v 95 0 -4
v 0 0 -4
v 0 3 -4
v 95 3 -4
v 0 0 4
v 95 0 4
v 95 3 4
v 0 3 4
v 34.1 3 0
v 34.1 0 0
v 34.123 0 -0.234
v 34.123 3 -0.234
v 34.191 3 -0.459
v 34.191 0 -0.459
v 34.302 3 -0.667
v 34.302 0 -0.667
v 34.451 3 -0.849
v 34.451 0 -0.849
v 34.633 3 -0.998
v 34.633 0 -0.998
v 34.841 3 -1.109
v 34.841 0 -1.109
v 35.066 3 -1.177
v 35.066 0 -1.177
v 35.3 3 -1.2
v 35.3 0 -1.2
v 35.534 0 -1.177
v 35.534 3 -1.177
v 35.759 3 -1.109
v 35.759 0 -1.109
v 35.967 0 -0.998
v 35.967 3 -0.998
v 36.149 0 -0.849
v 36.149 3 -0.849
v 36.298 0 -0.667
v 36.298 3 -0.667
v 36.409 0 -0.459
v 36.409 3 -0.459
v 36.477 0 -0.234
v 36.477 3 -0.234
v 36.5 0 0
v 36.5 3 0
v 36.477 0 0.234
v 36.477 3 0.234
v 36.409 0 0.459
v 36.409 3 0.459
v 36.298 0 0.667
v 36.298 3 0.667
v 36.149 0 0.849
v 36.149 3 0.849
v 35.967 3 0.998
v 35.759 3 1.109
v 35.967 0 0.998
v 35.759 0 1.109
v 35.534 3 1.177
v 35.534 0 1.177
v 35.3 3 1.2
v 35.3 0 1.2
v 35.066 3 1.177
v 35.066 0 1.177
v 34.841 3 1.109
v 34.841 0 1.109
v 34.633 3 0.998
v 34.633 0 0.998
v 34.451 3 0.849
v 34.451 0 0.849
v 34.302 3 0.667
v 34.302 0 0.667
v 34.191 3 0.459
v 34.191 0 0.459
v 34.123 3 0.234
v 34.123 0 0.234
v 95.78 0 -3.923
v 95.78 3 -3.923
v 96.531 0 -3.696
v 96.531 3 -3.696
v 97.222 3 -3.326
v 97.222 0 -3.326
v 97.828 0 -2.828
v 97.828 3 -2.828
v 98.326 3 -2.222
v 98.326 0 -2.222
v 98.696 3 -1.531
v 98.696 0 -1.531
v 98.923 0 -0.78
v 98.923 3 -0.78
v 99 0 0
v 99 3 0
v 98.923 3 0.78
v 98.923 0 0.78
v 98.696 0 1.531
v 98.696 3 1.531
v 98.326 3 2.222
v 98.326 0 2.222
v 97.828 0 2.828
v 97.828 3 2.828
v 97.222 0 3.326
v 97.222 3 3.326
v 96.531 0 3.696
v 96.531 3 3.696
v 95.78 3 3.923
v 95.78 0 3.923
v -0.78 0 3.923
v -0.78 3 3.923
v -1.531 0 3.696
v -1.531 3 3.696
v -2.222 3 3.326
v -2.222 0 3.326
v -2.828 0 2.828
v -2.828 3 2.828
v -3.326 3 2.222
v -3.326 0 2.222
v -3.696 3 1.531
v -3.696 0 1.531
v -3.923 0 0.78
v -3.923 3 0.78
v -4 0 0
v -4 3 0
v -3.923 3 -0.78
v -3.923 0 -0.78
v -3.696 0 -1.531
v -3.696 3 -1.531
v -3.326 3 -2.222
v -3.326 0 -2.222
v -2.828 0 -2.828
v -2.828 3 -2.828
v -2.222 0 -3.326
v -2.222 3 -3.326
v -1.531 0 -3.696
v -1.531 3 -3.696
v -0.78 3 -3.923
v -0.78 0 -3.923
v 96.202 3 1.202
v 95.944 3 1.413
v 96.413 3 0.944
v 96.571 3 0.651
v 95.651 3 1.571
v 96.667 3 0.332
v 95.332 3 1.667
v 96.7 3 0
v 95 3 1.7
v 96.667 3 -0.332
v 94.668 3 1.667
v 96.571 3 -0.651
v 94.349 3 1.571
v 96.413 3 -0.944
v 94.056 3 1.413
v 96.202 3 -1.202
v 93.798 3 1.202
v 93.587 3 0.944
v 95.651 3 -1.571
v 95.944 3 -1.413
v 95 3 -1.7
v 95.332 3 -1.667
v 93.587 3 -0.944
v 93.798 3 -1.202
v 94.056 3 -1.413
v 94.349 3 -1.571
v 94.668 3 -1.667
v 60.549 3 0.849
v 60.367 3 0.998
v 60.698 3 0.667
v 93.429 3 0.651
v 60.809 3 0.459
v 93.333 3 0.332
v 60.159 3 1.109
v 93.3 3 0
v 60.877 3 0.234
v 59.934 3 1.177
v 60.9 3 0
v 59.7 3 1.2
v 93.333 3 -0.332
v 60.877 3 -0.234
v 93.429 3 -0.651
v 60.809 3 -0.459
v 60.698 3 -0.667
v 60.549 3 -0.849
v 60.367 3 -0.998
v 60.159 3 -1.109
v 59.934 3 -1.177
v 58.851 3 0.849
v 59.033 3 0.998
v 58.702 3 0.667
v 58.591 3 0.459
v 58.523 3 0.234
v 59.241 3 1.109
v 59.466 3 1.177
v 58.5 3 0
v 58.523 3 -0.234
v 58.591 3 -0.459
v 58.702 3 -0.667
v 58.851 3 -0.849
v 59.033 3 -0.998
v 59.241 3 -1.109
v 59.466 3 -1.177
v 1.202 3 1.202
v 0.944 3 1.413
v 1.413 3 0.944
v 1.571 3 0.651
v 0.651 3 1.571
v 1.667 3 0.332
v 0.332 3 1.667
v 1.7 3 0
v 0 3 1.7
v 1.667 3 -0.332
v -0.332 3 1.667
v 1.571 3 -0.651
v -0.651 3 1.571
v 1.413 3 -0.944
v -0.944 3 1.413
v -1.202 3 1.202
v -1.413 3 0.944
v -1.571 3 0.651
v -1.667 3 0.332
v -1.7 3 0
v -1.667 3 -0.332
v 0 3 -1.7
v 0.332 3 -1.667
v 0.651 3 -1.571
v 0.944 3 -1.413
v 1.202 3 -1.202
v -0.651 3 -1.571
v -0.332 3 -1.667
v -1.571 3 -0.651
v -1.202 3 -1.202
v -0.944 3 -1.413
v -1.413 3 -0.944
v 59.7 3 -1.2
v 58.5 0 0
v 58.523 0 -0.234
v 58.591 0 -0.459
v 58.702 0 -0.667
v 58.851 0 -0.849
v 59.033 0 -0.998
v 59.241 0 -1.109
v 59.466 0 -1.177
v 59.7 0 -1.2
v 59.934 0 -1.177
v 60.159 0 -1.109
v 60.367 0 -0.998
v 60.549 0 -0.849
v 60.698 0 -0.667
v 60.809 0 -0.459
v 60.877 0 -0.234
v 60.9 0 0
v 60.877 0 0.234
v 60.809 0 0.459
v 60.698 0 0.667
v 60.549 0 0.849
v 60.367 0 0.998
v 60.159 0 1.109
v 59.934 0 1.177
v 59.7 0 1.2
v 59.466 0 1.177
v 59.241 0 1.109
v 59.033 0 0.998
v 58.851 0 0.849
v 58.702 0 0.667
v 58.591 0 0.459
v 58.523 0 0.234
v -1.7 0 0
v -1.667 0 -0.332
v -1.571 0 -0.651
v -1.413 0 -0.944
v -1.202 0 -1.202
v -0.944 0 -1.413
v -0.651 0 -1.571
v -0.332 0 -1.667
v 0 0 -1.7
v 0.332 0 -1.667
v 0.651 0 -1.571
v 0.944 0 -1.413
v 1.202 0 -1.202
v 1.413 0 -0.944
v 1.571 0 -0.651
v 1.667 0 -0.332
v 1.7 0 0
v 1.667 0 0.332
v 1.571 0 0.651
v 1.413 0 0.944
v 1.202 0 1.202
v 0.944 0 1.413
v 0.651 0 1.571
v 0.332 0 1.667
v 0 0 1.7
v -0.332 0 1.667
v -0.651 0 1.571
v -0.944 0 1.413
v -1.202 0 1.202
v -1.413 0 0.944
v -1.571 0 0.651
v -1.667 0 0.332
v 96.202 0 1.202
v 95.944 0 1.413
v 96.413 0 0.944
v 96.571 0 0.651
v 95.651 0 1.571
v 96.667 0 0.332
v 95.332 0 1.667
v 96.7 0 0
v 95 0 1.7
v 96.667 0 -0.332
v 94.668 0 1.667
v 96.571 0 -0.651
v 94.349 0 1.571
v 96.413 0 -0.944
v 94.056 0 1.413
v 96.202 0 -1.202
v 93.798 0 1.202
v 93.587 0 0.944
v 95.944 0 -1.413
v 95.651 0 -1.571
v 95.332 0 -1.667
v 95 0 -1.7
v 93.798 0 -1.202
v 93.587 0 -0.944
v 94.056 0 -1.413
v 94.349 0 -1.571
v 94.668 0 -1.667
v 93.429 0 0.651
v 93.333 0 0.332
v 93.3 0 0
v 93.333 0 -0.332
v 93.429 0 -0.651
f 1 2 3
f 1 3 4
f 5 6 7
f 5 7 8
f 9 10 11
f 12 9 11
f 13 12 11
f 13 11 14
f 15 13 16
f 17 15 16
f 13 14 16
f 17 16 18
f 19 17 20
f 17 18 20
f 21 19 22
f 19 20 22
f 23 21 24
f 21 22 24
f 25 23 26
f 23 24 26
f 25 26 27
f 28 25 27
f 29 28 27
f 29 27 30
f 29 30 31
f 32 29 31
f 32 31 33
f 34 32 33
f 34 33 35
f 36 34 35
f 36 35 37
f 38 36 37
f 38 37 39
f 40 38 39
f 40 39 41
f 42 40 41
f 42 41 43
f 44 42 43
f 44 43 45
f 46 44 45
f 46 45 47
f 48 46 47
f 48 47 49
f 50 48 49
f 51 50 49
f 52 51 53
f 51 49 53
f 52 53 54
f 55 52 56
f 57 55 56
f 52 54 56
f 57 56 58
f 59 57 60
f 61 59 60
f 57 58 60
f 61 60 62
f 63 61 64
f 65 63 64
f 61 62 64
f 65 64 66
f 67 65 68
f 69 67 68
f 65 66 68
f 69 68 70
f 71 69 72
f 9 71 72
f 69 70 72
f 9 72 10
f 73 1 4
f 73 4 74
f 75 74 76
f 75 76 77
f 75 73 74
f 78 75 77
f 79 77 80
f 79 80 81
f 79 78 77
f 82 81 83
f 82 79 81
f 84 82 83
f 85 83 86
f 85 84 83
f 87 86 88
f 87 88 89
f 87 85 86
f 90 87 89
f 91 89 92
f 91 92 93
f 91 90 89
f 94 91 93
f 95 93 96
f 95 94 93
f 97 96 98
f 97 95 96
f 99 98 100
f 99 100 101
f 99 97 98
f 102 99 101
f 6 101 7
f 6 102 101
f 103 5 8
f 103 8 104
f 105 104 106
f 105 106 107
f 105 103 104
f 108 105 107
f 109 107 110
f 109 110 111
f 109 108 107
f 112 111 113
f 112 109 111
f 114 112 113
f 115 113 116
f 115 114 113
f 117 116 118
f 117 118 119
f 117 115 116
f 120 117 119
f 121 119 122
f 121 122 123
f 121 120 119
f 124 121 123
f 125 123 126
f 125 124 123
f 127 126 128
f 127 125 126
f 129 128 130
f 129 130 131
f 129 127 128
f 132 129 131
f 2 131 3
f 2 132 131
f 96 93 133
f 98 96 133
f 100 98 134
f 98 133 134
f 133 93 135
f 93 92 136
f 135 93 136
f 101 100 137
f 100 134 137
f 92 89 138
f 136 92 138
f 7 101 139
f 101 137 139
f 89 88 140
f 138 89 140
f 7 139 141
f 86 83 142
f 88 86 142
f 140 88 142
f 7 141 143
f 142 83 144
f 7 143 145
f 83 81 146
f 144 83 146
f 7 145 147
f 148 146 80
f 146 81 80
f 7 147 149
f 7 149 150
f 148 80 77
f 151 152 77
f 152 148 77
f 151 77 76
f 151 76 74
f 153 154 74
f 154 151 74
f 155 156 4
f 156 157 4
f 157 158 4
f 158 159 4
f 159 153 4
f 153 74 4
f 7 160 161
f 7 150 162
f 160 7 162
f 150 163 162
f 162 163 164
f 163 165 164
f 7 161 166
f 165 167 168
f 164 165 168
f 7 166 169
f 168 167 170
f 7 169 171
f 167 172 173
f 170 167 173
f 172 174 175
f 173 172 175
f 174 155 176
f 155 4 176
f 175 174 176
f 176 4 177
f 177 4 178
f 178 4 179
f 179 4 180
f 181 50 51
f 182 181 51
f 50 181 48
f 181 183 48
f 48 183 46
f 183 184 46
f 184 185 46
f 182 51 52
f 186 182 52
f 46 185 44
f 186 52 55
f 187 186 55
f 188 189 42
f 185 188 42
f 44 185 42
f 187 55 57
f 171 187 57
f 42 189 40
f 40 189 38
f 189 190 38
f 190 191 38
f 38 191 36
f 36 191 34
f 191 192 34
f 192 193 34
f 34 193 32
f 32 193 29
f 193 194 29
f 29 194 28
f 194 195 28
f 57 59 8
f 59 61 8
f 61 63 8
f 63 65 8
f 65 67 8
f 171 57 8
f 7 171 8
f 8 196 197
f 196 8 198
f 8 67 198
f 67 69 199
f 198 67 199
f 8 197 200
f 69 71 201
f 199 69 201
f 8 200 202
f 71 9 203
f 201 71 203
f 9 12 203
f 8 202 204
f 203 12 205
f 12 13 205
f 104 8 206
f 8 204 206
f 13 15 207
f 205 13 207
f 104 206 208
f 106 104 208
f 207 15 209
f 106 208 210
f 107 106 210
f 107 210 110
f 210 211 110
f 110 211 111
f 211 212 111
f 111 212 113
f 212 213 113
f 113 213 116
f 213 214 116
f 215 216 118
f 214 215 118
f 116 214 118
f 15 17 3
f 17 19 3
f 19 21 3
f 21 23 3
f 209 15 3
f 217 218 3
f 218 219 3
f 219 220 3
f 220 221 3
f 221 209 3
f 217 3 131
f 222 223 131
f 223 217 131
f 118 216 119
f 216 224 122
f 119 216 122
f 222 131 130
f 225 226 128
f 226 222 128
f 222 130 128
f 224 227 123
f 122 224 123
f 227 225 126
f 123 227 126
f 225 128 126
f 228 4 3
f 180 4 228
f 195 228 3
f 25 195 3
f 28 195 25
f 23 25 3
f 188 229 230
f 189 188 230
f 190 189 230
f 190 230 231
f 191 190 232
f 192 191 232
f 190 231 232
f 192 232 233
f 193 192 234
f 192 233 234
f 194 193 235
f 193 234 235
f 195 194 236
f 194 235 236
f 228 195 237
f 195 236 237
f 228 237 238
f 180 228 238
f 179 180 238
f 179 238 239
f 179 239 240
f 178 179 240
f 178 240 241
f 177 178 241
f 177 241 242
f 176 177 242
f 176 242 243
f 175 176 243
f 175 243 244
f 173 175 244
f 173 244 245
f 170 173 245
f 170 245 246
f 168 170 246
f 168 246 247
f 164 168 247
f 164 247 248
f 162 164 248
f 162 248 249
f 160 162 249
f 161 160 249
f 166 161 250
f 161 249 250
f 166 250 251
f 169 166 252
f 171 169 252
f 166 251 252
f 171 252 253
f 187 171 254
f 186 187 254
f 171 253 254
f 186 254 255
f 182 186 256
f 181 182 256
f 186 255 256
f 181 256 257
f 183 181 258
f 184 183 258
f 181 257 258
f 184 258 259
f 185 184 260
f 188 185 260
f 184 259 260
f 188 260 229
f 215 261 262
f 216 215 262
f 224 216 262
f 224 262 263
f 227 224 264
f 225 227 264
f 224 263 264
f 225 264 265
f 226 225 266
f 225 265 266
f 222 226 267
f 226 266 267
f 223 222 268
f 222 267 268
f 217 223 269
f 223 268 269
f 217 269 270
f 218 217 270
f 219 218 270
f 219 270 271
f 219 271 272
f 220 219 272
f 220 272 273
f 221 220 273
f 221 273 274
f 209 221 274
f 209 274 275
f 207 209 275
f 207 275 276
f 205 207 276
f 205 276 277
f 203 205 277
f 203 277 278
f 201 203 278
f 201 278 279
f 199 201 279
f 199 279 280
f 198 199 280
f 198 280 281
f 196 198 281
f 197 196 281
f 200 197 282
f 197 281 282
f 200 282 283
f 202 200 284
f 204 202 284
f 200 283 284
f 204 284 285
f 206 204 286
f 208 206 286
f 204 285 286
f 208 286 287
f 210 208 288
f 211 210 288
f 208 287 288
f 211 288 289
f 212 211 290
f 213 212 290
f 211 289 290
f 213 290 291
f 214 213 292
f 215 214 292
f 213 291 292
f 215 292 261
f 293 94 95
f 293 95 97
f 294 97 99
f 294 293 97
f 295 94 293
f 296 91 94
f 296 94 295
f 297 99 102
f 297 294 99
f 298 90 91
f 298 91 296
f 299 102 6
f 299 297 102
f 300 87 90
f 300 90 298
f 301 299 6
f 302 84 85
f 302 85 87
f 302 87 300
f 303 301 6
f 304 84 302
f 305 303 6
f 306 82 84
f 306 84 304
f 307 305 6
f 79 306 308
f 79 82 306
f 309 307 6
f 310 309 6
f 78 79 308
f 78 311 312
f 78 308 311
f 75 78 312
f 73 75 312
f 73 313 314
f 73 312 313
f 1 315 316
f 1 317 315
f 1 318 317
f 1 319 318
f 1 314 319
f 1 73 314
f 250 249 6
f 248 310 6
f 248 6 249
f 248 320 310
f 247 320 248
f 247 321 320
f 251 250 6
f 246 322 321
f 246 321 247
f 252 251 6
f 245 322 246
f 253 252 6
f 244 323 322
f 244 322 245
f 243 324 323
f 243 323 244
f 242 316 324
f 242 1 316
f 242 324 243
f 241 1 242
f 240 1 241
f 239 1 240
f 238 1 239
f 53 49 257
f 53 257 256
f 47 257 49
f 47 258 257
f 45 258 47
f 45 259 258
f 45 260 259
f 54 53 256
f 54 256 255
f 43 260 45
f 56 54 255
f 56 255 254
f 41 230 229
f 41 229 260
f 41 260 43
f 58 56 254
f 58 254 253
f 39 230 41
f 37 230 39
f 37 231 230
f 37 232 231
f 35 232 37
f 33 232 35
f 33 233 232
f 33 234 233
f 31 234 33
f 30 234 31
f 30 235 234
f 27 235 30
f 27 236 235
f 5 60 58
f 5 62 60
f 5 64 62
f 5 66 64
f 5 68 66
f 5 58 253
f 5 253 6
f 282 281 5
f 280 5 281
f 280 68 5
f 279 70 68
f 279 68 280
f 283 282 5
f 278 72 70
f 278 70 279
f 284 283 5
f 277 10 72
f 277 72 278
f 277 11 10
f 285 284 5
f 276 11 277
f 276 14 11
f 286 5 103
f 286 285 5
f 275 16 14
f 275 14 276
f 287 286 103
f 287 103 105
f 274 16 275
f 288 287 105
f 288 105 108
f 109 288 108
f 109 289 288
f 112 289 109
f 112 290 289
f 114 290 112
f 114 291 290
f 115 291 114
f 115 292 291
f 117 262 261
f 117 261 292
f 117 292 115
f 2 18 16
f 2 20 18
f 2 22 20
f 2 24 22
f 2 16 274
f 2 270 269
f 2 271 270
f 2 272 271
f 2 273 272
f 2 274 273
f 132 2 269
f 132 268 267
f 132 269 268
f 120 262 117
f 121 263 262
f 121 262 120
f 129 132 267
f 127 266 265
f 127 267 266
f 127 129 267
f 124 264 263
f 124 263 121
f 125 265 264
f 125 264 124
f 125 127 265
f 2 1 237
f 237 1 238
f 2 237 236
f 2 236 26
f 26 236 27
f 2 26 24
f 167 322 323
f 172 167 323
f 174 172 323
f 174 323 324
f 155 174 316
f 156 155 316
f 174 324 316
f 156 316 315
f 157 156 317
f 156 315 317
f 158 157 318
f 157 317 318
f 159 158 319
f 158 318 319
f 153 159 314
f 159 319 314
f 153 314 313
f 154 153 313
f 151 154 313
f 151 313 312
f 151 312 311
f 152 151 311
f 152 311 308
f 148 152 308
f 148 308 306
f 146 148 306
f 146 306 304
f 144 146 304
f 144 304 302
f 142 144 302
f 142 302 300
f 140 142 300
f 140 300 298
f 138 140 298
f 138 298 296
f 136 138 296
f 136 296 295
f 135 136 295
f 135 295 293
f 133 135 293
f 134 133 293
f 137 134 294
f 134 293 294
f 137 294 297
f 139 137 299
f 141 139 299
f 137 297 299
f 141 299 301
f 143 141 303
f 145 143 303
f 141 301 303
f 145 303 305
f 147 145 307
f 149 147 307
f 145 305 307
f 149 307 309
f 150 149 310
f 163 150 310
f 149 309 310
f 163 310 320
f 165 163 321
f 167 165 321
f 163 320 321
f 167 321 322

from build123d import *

# Parameters (mm, degrees)
BOSS_EXTRUDE1_DEPTH  = 3
M3_CLEARANCE_HOLE1_D = 3.4
M2_CLEARANCE_HOLE1_D = 2.4


with BuildPart() as part:
    # Sketch1 → Boss-Extrude1 (new body)
    with BuildSketch(Plane(origin=(0, 0, 0), x_dir=(1, 0, 0), z_dir=(0, 1, 0))):
        with BuildLine():
            Line((0, 4), (95, 4))
            ThreePointArc((95, 4), (99, 0), (95, -4))
            Line((95, -4), (0, -4))
            ThreePointArc((0, -4), (-4, 0), (0, 4))
        make_face()
    extrude(amount=BOSS_EXTRUDE1_DEPTH)

    # M3 Clearance Hole1 (through all)
    with Locations(Plane(origin=(0, 3, 0), x_dir=(1, 0, 0), z_dir=(0, 1, 0))):
        with Locations((95, 0), (0, 0)):
            Hole(M3_CLEARANCE_HOLE1_D / 2)

    # M2 Clearance Hole1 (through all)
    with Locations(Plane(origin=(0, 3, 0), x_dir=(1, 0, 0), z_dir=(0, 1, 0))):
        with Locations((59.7, 0), (35.3, 0)):
            Hole(M2_CLEARANCE_HOLE1_D / 2)


solid = part.part
